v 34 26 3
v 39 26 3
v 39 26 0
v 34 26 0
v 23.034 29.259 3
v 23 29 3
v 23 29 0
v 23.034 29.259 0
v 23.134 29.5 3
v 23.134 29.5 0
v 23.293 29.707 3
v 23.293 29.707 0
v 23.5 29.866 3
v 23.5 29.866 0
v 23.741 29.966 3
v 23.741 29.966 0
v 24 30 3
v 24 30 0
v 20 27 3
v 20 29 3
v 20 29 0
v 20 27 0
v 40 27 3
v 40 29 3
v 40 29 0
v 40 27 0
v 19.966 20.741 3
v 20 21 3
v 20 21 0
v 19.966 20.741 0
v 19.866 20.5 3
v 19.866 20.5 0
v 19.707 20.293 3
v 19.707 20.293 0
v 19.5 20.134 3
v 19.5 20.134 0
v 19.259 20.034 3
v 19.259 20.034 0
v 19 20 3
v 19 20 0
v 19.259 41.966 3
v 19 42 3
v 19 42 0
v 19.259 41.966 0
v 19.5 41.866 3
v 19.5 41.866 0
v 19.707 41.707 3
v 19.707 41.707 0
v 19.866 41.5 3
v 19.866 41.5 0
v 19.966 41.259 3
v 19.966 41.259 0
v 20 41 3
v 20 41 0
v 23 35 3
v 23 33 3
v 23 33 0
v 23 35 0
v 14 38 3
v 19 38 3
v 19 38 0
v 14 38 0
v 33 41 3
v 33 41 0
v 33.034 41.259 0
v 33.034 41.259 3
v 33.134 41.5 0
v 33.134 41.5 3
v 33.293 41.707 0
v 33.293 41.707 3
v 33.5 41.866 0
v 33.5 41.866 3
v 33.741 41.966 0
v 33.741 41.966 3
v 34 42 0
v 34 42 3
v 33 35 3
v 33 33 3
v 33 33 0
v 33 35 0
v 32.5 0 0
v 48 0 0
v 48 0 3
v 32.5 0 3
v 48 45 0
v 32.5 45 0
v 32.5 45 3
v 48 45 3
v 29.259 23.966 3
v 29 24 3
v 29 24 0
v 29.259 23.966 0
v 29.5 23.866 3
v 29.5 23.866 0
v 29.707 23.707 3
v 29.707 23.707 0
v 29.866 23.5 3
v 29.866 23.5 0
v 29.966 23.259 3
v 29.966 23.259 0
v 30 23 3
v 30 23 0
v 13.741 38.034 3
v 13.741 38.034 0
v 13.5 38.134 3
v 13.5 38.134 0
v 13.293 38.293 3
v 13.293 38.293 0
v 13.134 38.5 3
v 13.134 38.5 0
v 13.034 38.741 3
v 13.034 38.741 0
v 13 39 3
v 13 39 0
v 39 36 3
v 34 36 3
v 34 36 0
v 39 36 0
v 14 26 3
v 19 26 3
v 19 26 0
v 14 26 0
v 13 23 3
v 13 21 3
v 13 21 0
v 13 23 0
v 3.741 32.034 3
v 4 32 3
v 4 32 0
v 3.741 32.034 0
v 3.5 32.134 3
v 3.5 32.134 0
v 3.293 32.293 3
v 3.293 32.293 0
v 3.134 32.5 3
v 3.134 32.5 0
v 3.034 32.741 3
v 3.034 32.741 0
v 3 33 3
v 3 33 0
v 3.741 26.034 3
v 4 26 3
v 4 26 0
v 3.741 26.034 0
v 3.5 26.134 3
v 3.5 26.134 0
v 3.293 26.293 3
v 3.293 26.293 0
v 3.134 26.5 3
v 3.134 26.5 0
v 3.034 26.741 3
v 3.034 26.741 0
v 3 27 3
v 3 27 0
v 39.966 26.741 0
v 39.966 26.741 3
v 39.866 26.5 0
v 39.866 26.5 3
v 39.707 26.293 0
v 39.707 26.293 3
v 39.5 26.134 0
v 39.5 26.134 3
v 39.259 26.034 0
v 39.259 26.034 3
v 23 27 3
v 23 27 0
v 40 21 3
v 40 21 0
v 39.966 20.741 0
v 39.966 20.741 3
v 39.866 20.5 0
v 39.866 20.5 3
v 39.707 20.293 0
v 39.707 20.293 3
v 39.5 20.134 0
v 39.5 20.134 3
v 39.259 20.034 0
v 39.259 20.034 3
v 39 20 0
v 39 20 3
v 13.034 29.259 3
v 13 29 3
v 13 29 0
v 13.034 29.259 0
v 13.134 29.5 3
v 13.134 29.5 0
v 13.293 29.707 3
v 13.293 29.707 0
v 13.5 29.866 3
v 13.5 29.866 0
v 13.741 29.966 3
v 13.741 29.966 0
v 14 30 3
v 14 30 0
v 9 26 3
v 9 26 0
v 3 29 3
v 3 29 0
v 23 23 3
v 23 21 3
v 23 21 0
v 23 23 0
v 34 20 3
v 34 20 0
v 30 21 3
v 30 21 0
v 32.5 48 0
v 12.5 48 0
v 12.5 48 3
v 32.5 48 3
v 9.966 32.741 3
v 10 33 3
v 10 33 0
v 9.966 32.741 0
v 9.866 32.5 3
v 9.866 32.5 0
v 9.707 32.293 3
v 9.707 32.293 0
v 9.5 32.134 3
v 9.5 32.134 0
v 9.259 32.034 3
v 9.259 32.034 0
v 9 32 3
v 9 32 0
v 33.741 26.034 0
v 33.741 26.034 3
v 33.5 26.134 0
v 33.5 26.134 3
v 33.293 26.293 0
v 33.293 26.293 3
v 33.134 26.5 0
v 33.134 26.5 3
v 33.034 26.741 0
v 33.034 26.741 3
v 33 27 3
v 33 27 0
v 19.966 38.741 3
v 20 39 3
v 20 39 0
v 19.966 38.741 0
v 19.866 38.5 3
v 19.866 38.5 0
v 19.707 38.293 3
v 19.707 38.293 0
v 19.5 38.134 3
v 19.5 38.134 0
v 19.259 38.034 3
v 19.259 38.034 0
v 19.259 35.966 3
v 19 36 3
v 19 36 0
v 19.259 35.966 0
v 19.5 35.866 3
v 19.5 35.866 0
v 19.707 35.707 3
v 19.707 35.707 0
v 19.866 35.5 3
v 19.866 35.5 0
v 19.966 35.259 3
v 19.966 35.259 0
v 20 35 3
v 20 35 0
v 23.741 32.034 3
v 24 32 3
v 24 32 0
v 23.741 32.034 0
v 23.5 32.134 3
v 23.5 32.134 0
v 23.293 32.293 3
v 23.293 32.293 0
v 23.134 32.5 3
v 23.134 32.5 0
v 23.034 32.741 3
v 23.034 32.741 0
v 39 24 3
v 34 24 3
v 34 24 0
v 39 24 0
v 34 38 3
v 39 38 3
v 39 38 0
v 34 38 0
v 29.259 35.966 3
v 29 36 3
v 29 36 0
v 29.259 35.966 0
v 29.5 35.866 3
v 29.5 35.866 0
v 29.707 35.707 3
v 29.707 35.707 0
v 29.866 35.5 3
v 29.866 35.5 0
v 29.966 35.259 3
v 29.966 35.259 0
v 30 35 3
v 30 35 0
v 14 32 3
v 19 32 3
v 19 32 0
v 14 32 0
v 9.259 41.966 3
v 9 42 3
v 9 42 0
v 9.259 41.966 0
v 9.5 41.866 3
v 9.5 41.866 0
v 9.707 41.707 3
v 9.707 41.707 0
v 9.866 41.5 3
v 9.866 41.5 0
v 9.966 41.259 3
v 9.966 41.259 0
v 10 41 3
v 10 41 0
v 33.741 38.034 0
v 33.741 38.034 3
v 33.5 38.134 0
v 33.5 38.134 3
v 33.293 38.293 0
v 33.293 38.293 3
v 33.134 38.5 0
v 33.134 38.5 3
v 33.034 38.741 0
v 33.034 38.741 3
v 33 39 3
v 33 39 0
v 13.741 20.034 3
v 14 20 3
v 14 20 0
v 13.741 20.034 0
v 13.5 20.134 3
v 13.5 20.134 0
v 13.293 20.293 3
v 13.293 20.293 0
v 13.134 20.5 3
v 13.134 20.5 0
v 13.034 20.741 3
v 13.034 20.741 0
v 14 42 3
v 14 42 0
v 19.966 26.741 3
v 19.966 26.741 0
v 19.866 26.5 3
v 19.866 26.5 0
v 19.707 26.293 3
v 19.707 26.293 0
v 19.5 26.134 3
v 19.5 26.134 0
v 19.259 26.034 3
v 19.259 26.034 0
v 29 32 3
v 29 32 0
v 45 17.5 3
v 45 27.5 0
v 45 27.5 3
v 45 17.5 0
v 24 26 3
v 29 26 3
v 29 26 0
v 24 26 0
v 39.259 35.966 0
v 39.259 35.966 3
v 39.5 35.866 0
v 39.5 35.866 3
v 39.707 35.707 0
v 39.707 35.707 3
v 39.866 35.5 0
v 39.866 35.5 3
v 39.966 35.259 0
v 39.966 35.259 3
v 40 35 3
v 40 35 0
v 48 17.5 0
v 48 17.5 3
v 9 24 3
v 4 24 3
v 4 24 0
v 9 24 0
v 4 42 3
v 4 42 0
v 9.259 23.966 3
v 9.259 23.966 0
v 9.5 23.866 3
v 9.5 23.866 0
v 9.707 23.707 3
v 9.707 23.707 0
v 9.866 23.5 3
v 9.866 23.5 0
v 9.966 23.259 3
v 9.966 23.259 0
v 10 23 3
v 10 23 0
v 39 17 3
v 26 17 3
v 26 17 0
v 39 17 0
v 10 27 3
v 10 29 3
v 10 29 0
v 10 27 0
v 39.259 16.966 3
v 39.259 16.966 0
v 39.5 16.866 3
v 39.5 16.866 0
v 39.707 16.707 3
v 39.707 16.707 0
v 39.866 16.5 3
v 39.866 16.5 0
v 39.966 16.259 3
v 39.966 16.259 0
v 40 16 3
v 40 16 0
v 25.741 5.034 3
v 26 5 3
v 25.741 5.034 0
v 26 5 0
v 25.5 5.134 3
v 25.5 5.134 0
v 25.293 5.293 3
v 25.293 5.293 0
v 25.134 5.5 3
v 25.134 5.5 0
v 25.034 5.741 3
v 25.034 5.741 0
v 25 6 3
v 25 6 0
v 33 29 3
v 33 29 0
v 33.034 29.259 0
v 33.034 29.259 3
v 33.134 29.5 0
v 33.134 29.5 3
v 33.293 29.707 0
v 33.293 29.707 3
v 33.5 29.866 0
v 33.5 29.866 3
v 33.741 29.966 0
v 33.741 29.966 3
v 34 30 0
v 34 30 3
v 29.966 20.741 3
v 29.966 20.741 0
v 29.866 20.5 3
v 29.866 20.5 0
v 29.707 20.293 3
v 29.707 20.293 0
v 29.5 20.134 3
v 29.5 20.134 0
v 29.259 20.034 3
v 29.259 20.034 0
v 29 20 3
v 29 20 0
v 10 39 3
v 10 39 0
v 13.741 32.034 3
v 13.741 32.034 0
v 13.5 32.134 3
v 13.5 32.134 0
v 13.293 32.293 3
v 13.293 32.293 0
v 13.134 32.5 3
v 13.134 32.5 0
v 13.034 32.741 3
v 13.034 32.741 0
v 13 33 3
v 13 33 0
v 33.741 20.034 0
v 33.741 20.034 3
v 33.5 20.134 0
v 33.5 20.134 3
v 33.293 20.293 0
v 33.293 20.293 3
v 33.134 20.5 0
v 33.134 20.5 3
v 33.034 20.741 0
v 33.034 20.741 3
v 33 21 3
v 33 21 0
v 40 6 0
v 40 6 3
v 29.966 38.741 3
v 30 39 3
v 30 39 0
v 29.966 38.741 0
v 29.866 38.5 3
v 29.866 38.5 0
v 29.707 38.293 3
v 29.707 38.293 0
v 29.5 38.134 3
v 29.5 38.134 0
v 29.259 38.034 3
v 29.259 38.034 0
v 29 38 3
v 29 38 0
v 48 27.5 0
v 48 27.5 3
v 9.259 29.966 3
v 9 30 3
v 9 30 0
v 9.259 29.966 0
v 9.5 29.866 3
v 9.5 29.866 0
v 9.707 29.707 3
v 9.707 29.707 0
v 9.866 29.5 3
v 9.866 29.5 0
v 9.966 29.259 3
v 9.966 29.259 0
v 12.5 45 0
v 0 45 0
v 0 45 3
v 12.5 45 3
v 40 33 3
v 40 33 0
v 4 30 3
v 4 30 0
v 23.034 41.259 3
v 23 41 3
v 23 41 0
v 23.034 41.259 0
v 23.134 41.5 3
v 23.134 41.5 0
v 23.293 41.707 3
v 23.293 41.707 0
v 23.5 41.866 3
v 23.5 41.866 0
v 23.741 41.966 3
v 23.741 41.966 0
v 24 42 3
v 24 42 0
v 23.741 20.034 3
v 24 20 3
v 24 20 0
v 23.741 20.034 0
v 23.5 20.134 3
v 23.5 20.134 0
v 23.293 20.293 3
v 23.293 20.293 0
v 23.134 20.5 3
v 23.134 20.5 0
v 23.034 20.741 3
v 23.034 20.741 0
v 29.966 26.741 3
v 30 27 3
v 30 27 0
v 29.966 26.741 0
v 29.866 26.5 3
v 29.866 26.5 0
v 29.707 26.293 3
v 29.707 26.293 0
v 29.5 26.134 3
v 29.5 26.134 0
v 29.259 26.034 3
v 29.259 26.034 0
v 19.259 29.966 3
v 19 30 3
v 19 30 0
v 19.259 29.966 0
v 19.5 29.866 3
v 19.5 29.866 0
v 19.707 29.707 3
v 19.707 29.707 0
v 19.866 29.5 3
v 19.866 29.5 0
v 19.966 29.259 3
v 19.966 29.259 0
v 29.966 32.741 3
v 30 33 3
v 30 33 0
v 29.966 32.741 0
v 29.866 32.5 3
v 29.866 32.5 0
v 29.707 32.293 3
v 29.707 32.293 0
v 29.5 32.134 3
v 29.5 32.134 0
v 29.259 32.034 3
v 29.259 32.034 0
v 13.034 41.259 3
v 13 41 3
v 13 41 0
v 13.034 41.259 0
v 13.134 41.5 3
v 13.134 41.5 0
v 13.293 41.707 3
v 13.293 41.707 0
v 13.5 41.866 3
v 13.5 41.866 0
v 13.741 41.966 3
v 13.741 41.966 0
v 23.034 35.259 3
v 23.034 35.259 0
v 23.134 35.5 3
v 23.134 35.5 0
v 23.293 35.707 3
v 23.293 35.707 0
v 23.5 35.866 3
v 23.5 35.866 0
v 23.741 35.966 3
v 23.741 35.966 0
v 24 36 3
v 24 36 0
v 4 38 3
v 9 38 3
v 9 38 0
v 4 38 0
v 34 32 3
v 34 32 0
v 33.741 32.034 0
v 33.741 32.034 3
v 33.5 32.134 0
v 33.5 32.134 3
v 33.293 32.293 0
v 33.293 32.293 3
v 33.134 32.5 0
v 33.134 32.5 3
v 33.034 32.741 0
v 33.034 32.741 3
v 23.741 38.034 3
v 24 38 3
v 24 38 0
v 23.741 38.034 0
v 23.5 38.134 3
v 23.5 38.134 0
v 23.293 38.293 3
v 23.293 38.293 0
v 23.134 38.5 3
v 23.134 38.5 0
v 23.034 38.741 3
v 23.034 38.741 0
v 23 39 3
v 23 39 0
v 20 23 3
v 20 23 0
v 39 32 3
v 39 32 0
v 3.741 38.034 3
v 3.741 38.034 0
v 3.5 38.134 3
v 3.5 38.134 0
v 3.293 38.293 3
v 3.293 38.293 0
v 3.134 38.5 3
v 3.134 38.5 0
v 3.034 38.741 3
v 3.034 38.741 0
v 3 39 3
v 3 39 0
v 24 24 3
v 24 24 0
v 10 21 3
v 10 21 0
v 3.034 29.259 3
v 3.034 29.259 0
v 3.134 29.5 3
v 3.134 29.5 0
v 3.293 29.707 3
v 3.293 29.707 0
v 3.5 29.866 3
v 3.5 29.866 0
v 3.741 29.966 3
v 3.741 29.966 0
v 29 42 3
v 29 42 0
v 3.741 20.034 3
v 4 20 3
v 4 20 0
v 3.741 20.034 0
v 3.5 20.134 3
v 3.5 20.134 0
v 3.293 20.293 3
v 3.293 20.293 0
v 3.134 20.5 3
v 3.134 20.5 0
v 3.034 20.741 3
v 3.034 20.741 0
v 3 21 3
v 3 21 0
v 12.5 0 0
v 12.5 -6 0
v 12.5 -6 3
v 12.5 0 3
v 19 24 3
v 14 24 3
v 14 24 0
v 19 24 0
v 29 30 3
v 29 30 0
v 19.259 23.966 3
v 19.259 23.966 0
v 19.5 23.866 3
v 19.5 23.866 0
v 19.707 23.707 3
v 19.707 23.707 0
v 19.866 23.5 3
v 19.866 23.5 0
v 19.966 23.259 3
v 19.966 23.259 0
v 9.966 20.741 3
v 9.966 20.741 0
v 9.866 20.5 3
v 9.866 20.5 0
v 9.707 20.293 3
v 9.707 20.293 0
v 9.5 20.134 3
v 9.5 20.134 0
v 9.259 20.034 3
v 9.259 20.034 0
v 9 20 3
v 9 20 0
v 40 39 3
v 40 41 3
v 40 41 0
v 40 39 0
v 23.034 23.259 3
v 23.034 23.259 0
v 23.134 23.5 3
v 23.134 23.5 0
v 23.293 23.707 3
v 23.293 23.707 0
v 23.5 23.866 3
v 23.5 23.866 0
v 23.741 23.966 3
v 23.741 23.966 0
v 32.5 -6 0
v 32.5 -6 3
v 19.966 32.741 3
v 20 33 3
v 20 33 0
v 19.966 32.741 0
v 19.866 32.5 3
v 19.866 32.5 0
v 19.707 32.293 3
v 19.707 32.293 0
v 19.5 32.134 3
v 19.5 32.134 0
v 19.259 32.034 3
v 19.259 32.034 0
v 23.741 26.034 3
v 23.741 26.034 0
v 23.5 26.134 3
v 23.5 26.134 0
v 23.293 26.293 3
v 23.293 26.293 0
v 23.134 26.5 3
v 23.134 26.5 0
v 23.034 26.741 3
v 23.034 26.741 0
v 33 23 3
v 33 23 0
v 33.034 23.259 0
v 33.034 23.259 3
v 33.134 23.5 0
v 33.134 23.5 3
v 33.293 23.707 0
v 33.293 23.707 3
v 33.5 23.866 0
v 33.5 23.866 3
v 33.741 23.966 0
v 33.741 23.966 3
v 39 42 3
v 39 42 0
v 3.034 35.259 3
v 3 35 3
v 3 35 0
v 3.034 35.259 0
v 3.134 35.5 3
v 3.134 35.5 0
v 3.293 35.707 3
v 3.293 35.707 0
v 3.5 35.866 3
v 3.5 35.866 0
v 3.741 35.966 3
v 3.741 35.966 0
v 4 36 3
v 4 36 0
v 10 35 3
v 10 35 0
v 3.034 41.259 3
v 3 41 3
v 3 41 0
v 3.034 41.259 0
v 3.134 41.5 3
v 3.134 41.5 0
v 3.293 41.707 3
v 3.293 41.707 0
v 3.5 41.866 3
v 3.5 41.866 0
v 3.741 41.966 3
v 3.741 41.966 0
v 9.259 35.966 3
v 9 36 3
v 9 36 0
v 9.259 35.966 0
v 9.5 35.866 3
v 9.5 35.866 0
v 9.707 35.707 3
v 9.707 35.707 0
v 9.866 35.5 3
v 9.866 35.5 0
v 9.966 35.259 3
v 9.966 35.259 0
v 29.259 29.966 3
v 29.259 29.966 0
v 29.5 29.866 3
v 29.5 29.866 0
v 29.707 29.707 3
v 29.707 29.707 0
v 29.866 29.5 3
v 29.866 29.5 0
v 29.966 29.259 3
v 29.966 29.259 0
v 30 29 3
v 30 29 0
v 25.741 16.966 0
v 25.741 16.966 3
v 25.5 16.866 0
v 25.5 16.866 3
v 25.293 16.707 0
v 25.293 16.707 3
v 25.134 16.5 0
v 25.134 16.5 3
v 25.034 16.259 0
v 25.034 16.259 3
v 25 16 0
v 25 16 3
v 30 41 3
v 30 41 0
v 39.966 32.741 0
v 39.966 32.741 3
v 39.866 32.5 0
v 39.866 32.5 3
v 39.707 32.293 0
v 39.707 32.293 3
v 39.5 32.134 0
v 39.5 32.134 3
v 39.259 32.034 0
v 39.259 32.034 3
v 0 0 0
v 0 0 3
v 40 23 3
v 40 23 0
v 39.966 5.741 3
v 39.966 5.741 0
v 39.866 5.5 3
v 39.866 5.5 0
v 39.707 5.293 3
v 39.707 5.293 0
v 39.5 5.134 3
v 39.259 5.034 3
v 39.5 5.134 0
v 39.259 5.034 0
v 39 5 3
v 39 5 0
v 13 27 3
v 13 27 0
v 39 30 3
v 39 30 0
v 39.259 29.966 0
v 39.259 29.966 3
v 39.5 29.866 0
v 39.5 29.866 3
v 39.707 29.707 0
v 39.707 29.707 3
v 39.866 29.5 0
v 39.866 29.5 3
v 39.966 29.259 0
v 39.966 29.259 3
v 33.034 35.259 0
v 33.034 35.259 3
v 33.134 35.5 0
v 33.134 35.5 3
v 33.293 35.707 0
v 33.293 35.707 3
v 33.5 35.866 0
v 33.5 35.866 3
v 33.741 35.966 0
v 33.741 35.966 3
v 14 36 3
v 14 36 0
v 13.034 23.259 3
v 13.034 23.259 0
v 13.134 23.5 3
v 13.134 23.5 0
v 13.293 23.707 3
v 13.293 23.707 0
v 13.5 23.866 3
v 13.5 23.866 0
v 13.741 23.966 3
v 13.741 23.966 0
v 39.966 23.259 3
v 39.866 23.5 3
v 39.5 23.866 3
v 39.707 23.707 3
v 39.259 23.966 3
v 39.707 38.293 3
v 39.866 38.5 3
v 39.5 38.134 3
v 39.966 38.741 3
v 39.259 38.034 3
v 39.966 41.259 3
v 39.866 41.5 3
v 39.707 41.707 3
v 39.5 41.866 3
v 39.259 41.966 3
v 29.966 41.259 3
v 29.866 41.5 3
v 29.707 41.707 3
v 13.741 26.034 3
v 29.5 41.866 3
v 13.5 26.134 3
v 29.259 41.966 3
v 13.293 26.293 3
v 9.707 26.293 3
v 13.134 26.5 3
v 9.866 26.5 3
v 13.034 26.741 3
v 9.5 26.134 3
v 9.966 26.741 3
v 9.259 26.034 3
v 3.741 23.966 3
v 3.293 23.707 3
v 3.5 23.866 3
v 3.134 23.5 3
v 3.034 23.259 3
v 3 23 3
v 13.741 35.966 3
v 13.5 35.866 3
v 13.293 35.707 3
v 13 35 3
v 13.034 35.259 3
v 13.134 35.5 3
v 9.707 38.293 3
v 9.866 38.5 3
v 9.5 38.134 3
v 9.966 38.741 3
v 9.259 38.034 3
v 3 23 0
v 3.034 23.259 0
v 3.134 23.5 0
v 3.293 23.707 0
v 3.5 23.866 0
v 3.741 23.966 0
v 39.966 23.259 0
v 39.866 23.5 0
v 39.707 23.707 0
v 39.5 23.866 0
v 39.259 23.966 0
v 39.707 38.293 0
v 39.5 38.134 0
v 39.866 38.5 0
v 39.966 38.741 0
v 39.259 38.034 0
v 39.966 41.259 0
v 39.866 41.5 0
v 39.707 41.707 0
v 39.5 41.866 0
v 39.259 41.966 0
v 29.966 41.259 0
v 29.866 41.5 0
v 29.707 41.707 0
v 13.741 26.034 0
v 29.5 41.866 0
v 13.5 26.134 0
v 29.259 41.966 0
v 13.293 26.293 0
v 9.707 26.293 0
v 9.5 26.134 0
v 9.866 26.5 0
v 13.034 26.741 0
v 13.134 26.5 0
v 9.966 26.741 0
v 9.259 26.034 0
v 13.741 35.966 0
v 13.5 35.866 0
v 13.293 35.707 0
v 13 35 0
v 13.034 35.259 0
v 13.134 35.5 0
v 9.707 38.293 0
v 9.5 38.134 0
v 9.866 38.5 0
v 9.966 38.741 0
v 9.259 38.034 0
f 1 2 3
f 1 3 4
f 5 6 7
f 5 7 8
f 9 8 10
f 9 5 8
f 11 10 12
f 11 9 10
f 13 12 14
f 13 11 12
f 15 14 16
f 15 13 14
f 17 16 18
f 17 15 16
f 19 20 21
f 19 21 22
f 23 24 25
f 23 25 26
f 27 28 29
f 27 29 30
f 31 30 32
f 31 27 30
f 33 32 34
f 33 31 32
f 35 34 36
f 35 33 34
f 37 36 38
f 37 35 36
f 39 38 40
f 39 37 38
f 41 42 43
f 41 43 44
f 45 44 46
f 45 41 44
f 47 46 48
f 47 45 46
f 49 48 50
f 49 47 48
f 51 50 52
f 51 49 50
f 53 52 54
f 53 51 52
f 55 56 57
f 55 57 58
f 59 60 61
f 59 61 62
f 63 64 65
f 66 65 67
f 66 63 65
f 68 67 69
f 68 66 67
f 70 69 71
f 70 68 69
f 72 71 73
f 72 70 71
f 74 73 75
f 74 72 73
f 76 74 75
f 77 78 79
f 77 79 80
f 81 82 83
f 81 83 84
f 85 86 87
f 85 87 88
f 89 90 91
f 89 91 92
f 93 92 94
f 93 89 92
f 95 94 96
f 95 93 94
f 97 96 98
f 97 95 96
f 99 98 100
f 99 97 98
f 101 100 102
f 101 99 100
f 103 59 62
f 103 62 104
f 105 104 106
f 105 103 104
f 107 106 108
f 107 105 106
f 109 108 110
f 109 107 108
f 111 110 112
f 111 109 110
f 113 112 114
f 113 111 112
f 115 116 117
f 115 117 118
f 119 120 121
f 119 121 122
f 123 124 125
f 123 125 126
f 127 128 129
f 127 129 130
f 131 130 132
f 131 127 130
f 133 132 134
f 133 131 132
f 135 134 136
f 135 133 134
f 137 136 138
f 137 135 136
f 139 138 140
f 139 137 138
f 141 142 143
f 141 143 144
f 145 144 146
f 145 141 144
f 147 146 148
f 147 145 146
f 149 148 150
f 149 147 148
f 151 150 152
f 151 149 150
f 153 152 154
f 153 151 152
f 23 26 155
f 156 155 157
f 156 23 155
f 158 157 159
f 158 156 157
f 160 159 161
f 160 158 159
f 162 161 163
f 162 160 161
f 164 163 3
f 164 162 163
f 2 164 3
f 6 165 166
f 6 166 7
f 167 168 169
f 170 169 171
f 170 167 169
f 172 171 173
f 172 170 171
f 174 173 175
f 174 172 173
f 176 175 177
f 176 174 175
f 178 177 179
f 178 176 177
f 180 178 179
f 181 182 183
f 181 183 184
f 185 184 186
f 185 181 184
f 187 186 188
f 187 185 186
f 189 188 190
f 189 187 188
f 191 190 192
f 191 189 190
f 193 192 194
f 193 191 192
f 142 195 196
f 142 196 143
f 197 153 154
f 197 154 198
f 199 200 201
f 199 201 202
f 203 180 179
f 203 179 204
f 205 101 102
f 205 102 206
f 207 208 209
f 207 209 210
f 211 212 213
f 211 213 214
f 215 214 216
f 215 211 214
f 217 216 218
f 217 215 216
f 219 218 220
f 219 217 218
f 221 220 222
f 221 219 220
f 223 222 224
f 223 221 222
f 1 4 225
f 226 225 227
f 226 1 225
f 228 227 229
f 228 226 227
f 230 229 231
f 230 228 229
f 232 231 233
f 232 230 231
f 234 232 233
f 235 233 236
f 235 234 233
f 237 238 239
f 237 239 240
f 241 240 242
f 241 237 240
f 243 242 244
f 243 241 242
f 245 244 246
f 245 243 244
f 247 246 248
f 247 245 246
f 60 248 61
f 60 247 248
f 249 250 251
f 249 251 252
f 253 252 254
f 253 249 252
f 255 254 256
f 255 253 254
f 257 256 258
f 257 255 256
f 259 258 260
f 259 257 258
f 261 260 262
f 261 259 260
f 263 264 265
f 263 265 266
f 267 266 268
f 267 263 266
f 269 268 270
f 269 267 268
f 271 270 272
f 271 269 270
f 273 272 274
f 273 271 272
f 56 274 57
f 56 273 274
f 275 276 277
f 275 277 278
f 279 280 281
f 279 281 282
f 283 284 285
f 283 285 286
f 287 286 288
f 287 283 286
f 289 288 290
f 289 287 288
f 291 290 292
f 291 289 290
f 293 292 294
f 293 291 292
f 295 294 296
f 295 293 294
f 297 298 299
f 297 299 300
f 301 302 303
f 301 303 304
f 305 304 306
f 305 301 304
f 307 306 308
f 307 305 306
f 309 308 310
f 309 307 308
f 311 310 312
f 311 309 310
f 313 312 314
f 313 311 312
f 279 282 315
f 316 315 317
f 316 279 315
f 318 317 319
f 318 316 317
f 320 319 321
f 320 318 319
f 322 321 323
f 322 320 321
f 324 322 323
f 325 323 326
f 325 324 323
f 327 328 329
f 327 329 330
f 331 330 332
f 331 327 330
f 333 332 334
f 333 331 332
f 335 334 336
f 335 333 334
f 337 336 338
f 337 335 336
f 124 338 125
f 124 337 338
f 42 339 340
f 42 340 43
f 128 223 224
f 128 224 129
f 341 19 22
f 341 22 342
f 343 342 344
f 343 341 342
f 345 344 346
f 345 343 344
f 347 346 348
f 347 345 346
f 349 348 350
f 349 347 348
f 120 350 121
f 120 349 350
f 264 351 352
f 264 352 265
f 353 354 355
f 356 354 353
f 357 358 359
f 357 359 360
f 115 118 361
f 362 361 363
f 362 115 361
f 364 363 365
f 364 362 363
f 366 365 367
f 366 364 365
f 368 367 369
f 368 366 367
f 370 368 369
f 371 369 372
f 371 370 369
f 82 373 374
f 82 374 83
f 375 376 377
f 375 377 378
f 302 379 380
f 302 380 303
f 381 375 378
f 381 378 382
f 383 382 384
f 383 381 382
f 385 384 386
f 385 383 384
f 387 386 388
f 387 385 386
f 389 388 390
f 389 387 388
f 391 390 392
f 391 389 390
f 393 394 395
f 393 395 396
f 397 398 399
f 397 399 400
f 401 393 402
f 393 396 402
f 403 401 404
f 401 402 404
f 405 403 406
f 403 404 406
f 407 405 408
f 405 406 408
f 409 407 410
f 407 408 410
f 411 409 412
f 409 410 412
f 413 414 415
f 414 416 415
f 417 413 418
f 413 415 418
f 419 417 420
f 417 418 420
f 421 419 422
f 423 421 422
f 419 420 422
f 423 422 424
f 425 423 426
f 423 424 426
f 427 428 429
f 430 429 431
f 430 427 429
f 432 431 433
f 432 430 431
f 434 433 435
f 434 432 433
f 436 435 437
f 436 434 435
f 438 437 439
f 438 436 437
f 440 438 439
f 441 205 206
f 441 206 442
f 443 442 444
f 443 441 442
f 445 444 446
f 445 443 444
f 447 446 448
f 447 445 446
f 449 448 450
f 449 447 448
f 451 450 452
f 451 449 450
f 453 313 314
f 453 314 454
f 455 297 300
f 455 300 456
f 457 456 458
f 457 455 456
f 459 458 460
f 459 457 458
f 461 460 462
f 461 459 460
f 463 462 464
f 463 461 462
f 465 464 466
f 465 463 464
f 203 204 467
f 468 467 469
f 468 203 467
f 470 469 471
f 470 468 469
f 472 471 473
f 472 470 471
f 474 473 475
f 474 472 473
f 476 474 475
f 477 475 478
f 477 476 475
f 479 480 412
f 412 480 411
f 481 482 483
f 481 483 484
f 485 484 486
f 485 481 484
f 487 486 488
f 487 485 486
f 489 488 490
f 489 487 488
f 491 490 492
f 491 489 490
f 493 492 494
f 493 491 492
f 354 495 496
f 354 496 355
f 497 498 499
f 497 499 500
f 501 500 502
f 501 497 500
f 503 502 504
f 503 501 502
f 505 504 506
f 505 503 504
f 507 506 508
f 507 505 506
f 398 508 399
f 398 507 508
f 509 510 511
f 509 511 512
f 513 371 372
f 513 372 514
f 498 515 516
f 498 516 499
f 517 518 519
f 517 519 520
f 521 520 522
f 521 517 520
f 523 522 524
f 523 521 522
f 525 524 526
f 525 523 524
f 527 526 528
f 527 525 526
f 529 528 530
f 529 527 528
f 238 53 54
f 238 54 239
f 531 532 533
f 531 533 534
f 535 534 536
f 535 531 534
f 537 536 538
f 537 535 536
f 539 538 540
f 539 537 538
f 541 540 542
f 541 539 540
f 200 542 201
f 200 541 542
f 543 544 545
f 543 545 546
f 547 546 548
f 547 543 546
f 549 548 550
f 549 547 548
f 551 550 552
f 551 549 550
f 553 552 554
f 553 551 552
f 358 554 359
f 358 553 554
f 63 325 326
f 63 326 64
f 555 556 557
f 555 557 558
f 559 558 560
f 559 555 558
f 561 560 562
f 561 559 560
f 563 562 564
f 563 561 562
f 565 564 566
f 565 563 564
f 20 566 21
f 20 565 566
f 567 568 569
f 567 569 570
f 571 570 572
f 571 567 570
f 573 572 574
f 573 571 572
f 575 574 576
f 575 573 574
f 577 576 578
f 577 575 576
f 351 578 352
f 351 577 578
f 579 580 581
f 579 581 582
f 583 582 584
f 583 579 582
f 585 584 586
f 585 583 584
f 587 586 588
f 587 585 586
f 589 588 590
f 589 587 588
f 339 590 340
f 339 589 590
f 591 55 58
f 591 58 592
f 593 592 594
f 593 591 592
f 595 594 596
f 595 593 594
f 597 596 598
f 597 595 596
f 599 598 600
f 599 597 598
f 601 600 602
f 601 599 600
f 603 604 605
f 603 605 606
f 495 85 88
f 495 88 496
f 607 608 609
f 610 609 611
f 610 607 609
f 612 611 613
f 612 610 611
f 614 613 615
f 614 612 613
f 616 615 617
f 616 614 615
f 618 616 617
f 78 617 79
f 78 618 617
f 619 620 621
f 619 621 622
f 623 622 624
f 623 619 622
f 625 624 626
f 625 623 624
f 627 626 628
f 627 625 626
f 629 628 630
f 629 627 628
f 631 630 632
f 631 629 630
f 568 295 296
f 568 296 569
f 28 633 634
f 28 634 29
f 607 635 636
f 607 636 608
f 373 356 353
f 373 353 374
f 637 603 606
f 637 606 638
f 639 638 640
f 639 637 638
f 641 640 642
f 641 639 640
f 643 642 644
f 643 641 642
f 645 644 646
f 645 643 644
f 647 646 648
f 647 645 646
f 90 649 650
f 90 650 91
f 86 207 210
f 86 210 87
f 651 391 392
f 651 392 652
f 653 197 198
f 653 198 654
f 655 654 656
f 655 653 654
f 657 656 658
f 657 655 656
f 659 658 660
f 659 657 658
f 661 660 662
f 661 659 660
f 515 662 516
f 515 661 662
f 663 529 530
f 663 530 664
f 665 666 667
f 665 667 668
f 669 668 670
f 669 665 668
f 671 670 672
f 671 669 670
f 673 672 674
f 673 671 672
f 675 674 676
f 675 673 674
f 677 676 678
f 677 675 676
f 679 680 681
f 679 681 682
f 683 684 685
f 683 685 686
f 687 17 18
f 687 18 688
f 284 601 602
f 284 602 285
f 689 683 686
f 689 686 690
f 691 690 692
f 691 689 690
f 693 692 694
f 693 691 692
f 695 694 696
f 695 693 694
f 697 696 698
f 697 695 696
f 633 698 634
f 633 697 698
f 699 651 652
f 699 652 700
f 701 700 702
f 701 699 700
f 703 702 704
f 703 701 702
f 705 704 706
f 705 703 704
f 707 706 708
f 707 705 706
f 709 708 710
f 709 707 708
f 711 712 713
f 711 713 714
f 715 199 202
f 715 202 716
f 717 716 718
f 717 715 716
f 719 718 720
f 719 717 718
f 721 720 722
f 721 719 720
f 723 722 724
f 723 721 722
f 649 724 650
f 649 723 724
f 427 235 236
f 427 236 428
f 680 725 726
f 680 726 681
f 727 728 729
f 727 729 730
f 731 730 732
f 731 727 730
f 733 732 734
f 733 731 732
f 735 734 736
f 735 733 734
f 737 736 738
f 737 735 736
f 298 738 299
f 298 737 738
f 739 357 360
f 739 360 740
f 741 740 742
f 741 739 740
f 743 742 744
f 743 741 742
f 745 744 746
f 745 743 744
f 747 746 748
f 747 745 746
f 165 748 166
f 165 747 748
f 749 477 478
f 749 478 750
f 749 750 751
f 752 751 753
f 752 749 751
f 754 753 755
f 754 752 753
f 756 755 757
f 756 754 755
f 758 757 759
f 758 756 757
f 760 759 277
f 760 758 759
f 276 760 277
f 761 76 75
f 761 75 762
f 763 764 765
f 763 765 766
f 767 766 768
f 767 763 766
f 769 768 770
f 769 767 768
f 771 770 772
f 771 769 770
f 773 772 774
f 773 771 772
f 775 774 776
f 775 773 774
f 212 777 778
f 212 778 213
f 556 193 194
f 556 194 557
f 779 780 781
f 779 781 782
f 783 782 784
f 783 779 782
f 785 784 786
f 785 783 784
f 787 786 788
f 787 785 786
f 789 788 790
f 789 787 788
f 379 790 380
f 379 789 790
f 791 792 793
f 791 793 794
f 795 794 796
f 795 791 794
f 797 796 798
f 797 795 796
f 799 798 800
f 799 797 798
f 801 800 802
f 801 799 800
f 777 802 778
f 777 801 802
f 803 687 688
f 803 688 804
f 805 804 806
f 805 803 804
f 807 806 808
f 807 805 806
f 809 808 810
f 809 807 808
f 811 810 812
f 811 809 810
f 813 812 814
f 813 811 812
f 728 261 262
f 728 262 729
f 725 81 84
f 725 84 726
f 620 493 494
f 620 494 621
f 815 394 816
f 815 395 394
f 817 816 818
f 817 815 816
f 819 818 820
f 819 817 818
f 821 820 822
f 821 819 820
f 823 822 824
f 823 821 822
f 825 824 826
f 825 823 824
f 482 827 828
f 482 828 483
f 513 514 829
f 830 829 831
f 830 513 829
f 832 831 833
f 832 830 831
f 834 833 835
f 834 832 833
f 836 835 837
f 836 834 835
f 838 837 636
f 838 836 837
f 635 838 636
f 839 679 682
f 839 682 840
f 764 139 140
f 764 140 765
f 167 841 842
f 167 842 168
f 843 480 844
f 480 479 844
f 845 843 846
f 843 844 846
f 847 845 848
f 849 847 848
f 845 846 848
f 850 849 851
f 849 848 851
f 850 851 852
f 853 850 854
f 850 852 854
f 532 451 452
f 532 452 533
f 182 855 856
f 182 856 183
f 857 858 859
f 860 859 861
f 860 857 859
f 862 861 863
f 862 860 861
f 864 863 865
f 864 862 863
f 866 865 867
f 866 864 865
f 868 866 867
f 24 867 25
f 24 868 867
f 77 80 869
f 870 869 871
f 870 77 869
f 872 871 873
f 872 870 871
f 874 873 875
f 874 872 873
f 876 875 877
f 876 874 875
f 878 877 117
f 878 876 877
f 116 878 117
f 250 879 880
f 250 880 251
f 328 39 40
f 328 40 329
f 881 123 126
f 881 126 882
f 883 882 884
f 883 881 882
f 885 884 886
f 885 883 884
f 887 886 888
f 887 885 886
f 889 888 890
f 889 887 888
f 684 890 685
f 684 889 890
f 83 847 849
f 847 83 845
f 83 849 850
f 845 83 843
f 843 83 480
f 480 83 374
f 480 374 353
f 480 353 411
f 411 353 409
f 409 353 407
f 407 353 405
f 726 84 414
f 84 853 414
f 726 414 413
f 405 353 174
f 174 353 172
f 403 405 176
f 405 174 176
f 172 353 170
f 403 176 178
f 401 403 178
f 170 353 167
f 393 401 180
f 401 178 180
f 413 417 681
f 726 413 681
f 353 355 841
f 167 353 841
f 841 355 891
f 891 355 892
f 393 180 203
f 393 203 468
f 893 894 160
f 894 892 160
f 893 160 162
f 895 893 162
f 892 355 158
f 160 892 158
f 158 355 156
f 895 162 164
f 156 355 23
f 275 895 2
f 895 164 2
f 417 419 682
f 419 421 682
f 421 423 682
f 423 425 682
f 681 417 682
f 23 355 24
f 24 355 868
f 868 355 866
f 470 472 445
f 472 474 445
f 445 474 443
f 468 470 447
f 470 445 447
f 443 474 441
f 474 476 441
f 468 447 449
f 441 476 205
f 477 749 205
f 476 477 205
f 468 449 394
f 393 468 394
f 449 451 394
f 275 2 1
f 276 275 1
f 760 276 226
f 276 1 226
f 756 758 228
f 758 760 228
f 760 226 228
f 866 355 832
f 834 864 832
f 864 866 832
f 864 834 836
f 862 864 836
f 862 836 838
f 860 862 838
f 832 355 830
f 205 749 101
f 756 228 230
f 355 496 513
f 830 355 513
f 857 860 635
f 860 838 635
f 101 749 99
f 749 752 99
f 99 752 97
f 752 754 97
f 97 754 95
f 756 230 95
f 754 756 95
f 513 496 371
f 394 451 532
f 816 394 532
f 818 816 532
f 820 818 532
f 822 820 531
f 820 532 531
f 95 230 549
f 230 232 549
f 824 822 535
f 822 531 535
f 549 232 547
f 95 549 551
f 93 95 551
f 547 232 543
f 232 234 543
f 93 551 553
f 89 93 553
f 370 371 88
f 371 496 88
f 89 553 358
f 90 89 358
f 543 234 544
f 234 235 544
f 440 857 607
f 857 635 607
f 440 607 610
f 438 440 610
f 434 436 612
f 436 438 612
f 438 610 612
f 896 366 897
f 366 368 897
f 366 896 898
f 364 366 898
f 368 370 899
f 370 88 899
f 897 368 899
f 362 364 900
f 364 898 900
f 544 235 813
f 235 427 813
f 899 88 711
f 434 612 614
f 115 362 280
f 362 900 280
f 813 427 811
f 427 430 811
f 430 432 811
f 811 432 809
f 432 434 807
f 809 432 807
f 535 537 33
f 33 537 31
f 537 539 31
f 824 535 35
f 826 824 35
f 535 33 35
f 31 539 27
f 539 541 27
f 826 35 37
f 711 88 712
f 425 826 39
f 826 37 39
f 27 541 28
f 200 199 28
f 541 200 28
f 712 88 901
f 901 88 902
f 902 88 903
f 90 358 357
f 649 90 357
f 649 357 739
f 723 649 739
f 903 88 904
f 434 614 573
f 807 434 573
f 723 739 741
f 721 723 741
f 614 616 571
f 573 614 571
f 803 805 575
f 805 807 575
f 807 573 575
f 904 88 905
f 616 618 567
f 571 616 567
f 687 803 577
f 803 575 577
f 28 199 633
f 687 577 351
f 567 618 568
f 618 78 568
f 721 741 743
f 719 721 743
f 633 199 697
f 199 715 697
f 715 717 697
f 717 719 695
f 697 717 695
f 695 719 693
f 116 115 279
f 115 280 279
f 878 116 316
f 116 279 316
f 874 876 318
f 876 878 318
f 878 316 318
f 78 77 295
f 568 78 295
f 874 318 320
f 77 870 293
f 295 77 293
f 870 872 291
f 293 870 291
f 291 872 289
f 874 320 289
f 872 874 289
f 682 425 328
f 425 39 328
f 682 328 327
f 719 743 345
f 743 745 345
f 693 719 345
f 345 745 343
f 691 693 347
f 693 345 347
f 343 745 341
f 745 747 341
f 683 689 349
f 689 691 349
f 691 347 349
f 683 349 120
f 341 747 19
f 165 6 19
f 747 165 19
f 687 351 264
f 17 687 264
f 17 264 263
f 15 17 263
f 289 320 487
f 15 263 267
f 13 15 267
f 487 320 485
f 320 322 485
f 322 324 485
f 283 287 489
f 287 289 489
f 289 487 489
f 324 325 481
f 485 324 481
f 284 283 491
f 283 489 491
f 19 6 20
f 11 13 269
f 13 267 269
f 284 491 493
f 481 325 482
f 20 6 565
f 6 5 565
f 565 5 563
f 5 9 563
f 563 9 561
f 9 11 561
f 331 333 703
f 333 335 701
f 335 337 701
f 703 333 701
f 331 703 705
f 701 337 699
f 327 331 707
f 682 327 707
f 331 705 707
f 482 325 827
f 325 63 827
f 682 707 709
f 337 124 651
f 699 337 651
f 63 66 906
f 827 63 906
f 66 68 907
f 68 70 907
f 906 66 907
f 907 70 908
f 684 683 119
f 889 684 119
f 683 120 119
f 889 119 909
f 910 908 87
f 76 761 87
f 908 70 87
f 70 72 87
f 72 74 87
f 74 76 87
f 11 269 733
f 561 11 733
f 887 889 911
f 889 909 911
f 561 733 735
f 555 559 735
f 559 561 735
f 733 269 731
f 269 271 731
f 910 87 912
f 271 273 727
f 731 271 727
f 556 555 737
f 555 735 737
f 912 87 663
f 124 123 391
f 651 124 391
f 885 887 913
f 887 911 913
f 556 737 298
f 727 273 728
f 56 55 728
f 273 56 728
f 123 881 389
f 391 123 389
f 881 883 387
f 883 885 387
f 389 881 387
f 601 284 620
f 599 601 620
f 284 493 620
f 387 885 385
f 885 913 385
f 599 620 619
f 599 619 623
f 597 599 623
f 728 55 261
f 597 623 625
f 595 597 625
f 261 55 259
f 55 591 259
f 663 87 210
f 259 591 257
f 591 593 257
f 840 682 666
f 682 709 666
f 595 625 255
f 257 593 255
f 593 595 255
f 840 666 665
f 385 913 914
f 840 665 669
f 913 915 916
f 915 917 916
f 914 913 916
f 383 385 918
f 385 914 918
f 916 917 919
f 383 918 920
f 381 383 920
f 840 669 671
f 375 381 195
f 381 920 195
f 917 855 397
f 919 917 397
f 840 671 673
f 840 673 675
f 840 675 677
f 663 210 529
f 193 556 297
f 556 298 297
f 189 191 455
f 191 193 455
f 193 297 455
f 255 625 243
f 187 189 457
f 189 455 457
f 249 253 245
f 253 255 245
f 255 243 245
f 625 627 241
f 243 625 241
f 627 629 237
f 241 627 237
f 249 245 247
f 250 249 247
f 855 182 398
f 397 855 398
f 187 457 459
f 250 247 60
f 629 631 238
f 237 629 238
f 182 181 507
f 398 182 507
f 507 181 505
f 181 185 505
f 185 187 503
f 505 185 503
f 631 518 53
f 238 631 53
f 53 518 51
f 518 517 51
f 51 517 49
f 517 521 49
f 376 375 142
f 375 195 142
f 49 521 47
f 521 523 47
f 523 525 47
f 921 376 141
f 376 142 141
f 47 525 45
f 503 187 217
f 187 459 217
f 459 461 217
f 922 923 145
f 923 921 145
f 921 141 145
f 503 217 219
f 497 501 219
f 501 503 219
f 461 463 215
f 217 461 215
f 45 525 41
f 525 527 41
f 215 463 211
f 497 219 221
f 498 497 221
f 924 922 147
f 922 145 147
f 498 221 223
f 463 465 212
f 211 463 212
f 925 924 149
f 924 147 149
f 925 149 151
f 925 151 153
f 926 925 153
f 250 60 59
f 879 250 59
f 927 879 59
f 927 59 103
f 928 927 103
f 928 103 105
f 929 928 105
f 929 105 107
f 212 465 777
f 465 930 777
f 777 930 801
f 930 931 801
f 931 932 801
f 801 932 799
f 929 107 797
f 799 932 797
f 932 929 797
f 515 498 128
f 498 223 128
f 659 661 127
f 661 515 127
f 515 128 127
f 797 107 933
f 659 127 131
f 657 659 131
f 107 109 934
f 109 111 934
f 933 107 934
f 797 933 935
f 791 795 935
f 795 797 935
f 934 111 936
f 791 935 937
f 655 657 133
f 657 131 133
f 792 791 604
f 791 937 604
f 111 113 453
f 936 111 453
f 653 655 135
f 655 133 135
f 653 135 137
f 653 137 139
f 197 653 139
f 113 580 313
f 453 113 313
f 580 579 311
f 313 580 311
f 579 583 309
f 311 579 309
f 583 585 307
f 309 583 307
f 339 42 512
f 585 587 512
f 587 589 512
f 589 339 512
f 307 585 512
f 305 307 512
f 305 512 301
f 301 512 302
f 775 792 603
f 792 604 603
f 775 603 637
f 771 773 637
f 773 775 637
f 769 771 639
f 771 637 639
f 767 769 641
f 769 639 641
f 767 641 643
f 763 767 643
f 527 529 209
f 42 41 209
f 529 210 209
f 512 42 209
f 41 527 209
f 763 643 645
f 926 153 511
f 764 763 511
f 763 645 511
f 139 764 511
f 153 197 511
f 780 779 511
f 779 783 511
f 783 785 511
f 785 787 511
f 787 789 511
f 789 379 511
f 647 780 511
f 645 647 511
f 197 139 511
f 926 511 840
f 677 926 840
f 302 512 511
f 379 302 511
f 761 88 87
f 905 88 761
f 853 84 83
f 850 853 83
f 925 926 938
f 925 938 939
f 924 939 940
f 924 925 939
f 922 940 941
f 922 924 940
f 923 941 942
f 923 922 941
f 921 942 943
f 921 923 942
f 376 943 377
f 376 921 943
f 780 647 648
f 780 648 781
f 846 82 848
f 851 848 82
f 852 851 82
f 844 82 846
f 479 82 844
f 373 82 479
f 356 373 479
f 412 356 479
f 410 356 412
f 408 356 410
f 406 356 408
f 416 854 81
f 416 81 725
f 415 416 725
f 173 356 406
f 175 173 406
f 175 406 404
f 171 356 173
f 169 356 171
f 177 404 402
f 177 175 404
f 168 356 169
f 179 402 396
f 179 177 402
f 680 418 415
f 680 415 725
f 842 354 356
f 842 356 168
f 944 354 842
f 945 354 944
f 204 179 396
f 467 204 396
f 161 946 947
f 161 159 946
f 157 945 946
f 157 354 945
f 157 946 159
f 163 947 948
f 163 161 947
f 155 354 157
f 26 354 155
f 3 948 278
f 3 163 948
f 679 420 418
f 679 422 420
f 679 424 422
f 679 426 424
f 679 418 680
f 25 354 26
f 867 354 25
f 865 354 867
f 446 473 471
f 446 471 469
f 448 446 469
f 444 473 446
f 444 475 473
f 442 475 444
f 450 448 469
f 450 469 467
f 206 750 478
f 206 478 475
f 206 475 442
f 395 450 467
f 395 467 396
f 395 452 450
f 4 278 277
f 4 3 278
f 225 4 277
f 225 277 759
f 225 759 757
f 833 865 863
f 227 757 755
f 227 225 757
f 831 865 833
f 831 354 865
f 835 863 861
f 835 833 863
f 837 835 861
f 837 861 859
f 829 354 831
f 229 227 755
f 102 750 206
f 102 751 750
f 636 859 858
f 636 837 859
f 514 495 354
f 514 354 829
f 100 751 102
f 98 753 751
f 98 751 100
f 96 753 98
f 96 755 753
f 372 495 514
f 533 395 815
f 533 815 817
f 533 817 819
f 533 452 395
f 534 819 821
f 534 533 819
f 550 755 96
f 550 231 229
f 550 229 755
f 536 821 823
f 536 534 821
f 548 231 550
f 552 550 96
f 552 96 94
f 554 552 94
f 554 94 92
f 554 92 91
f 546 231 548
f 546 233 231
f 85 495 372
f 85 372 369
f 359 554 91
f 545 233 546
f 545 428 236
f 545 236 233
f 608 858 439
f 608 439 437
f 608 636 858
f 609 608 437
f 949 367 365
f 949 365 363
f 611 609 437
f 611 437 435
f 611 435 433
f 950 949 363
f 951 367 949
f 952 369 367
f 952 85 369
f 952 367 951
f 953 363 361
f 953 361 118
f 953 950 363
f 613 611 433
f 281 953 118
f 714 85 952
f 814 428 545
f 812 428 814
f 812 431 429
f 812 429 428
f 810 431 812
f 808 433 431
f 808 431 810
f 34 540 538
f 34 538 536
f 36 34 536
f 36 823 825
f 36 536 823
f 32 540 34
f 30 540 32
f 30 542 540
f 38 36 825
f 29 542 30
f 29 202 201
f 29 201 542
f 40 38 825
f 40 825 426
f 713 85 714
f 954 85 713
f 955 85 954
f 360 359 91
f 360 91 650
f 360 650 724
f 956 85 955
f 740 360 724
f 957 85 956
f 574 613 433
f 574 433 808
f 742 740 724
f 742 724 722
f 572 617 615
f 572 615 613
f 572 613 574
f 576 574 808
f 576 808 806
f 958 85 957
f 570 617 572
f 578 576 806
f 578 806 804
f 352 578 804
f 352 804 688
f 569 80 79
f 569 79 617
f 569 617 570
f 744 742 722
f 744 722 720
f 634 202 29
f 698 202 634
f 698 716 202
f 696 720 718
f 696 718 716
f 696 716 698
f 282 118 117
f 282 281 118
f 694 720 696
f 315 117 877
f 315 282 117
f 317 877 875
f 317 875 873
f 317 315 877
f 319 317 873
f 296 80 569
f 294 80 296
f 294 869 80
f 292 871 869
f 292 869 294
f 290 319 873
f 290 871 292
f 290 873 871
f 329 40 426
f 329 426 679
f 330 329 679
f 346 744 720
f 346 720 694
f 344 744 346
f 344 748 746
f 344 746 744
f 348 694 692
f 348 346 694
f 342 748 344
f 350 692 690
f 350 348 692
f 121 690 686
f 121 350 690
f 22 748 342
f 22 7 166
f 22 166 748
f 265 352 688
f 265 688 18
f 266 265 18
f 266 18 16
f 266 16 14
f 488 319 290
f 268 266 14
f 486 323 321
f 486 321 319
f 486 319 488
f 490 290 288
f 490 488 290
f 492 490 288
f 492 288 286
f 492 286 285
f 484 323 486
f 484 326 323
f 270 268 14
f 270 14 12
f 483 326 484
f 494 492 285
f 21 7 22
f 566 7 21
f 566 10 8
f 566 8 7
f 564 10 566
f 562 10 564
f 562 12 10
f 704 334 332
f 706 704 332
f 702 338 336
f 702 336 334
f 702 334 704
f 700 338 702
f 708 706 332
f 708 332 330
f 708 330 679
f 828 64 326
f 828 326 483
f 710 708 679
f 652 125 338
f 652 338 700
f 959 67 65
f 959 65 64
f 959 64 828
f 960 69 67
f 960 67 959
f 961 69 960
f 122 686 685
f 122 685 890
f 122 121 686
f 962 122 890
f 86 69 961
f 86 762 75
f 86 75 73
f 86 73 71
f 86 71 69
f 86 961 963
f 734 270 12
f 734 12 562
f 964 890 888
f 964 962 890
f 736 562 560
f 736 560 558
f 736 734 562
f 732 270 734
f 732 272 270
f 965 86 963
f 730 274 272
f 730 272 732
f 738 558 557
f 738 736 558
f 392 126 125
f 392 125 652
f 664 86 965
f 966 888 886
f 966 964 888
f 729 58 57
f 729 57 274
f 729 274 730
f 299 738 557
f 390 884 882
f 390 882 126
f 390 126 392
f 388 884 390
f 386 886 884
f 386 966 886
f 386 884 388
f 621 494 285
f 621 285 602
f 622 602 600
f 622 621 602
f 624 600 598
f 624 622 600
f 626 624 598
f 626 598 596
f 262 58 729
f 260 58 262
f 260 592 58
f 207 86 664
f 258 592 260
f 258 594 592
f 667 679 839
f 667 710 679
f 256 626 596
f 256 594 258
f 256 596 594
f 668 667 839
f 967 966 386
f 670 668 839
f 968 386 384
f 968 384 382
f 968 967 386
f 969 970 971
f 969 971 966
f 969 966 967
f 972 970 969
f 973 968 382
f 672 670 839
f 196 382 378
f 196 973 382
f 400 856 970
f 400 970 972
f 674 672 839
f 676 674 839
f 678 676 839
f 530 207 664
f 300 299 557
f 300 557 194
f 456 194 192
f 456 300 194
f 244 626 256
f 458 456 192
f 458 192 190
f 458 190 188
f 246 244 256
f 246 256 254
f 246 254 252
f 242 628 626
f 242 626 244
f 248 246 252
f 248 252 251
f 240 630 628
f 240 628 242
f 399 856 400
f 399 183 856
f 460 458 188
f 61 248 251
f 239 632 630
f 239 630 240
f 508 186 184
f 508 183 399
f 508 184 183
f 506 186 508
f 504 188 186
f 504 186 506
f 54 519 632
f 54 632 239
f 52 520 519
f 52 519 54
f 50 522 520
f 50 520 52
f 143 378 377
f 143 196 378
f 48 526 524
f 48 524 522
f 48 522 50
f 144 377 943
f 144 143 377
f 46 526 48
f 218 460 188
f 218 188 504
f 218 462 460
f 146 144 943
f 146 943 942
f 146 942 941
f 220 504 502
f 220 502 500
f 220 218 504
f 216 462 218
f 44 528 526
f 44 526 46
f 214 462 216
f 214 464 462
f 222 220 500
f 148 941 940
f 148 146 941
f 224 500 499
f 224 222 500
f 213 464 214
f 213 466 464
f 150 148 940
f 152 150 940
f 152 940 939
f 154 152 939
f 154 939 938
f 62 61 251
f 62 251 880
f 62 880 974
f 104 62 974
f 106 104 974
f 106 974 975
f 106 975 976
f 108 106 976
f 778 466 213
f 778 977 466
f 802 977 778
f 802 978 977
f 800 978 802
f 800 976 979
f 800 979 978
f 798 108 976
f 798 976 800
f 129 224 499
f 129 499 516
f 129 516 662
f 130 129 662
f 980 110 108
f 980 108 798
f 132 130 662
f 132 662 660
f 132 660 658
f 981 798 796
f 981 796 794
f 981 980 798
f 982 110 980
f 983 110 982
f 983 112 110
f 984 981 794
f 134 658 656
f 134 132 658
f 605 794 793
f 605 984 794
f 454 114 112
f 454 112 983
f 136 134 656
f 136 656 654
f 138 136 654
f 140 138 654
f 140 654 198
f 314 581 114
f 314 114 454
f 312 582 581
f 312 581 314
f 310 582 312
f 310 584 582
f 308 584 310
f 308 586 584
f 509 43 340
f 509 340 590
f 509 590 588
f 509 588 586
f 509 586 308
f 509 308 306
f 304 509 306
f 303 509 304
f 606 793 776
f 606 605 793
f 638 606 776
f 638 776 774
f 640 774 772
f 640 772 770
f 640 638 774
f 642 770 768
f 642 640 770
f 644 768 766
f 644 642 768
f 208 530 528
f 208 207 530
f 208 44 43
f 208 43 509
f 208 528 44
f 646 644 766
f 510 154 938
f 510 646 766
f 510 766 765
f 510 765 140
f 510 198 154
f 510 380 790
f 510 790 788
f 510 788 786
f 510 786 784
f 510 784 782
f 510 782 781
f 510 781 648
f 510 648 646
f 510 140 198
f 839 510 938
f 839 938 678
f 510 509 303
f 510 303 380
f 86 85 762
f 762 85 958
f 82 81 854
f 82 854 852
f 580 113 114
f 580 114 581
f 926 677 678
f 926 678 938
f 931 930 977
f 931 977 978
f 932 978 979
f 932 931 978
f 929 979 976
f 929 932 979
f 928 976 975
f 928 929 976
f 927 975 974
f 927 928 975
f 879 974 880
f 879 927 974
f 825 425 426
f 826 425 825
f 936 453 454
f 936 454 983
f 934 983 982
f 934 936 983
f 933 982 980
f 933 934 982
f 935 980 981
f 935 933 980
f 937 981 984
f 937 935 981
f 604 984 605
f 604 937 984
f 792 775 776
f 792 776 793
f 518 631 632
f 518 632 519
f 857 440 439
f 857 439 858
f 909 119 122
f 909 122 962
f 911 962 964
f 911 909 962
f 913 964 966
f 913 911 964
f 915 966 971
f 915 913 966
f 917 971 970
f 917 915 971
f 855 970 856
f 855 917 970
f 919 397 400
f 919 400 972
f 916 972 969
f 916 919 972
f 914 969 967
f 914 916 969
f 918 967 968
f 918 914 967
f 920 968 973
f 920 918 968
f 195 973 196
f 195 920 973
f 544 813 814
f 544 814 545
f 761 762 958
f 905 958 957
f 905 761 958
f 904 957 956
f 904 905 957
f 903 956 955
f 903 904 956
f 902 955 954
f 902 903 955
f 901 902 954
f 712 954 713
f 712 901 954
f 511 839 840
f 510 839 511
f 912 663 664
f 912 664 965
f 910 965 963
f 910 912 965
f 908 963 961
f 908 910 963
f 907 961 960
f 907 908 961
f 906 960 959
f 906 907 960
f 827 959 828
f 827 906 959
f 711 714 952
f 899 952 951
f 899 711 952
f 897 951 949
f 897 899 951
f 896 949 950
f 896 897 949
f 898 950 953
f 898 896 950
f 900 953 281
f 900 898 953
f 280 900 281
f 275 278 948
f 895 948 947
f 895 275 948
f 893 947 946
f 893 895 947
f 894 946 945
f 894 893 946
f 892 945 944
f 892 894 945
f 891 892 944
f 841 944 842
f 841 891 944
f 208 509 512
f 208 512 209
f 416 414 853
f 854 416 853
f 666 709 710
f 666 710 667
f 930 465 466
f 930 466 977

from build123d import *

# Parameters (mm, degrees)
BOSS_EXTRUDE1_DEPTH  = 3
SKETCH2_W            = 15
SKETCH2_H            = 12
CUT_EXTRUDE1_DEPTH   = 68.948509917
FILLET1_R            = 1
CUT_EXTRUDE2_DEPTH   = 68.948509917
LPATTERN1_COUNT      = 4
LPATTERN1_PITCH      = 10
LPATTERN1_COUNT_DIR2 = 4
LPATTERN1_PITCH_DIR2 = 6


with BuildPart() as part:
    # Sketch1 → Boss-Extrude1 (new body)
    with BuildSketch(Plane.XY):
        Polygon((0, 0), (0, 45), (12.5, 45), (12.5, 48), (32.5, 48), (32.5, 45), (48, 45), (48, 27.5), (45, 27.5), (45, 17.5), (48, 17.5), (48, 0), (32.5, 0), (32.5, -6), (12.5, -6), (12.5, 0), align=None)
    extrude(amount=BOSS_EXTRUDE1_DEPTH)

    # Sketch2 → Cut-Extrude1 (cut, through all)
    with BuildSketch(Plane.XY.offset(3)):
        with Locations((32.5, 11)):
            Rectangle(SKETCH2_W, SKETCH2_H)
    extrude(amount=-CUT_EXTRUDE1_DEPTH, mode=Mode.SUBTRACT)

    # Fillet1
    fillet1_edges = [part.edges().sort_by_distance(p)[0] for p in [
        (25, 5, 1.5),
        (25, 17, 1.5),
        (40, 17, 1.5),
        (40, 5, 1.5),
    ]]
    fillet(fillet1_edges, radius=FILLET1_R)

    # Sketch3 → Cut-Extrude2 (cut, through all)
    with BuildSketch(Plane.XY.offset(3)):
        with BuildLine():
            Line((4, 42), (9, 42))
            ThreePointArc((9, 42), (9.707106781, 41.707106781), (10, 41))
            Line((10, 41), (10, 39))
            ThreePointArc((10, 39), (9.707106781, 38.292893219), (9, 38))
            Line((9, 38), (4, 38))
            ThreePointArc((4, 38), (3.292893219, 38.292893219), (3, 39))
            Line((3, 39), (3, 41))
            ThreePointArc((3, 41), (3.292893219, 41.707106781), (4, 42))
        make_face()
    cut_extrude2 = extrude(amount=-CUT_EXTRUDE2_DEPTH, mode=Mode.SUBTRACT)

    # LPattern1: Cut-Extrude2 4 × 4
    with Locations(*[(i * LPATTERN1_PITCH, -j * LPATTERN1_PITCH_DIR2, 0) for i in range(LPATTERN1_COUNT) for j in range(LPATTERN1_COUNT_DIR2) if (i, j) != (0, 0)]):
        add(cut_extrude2, mode=Mode.SUBTRACT)


solid = part.part
